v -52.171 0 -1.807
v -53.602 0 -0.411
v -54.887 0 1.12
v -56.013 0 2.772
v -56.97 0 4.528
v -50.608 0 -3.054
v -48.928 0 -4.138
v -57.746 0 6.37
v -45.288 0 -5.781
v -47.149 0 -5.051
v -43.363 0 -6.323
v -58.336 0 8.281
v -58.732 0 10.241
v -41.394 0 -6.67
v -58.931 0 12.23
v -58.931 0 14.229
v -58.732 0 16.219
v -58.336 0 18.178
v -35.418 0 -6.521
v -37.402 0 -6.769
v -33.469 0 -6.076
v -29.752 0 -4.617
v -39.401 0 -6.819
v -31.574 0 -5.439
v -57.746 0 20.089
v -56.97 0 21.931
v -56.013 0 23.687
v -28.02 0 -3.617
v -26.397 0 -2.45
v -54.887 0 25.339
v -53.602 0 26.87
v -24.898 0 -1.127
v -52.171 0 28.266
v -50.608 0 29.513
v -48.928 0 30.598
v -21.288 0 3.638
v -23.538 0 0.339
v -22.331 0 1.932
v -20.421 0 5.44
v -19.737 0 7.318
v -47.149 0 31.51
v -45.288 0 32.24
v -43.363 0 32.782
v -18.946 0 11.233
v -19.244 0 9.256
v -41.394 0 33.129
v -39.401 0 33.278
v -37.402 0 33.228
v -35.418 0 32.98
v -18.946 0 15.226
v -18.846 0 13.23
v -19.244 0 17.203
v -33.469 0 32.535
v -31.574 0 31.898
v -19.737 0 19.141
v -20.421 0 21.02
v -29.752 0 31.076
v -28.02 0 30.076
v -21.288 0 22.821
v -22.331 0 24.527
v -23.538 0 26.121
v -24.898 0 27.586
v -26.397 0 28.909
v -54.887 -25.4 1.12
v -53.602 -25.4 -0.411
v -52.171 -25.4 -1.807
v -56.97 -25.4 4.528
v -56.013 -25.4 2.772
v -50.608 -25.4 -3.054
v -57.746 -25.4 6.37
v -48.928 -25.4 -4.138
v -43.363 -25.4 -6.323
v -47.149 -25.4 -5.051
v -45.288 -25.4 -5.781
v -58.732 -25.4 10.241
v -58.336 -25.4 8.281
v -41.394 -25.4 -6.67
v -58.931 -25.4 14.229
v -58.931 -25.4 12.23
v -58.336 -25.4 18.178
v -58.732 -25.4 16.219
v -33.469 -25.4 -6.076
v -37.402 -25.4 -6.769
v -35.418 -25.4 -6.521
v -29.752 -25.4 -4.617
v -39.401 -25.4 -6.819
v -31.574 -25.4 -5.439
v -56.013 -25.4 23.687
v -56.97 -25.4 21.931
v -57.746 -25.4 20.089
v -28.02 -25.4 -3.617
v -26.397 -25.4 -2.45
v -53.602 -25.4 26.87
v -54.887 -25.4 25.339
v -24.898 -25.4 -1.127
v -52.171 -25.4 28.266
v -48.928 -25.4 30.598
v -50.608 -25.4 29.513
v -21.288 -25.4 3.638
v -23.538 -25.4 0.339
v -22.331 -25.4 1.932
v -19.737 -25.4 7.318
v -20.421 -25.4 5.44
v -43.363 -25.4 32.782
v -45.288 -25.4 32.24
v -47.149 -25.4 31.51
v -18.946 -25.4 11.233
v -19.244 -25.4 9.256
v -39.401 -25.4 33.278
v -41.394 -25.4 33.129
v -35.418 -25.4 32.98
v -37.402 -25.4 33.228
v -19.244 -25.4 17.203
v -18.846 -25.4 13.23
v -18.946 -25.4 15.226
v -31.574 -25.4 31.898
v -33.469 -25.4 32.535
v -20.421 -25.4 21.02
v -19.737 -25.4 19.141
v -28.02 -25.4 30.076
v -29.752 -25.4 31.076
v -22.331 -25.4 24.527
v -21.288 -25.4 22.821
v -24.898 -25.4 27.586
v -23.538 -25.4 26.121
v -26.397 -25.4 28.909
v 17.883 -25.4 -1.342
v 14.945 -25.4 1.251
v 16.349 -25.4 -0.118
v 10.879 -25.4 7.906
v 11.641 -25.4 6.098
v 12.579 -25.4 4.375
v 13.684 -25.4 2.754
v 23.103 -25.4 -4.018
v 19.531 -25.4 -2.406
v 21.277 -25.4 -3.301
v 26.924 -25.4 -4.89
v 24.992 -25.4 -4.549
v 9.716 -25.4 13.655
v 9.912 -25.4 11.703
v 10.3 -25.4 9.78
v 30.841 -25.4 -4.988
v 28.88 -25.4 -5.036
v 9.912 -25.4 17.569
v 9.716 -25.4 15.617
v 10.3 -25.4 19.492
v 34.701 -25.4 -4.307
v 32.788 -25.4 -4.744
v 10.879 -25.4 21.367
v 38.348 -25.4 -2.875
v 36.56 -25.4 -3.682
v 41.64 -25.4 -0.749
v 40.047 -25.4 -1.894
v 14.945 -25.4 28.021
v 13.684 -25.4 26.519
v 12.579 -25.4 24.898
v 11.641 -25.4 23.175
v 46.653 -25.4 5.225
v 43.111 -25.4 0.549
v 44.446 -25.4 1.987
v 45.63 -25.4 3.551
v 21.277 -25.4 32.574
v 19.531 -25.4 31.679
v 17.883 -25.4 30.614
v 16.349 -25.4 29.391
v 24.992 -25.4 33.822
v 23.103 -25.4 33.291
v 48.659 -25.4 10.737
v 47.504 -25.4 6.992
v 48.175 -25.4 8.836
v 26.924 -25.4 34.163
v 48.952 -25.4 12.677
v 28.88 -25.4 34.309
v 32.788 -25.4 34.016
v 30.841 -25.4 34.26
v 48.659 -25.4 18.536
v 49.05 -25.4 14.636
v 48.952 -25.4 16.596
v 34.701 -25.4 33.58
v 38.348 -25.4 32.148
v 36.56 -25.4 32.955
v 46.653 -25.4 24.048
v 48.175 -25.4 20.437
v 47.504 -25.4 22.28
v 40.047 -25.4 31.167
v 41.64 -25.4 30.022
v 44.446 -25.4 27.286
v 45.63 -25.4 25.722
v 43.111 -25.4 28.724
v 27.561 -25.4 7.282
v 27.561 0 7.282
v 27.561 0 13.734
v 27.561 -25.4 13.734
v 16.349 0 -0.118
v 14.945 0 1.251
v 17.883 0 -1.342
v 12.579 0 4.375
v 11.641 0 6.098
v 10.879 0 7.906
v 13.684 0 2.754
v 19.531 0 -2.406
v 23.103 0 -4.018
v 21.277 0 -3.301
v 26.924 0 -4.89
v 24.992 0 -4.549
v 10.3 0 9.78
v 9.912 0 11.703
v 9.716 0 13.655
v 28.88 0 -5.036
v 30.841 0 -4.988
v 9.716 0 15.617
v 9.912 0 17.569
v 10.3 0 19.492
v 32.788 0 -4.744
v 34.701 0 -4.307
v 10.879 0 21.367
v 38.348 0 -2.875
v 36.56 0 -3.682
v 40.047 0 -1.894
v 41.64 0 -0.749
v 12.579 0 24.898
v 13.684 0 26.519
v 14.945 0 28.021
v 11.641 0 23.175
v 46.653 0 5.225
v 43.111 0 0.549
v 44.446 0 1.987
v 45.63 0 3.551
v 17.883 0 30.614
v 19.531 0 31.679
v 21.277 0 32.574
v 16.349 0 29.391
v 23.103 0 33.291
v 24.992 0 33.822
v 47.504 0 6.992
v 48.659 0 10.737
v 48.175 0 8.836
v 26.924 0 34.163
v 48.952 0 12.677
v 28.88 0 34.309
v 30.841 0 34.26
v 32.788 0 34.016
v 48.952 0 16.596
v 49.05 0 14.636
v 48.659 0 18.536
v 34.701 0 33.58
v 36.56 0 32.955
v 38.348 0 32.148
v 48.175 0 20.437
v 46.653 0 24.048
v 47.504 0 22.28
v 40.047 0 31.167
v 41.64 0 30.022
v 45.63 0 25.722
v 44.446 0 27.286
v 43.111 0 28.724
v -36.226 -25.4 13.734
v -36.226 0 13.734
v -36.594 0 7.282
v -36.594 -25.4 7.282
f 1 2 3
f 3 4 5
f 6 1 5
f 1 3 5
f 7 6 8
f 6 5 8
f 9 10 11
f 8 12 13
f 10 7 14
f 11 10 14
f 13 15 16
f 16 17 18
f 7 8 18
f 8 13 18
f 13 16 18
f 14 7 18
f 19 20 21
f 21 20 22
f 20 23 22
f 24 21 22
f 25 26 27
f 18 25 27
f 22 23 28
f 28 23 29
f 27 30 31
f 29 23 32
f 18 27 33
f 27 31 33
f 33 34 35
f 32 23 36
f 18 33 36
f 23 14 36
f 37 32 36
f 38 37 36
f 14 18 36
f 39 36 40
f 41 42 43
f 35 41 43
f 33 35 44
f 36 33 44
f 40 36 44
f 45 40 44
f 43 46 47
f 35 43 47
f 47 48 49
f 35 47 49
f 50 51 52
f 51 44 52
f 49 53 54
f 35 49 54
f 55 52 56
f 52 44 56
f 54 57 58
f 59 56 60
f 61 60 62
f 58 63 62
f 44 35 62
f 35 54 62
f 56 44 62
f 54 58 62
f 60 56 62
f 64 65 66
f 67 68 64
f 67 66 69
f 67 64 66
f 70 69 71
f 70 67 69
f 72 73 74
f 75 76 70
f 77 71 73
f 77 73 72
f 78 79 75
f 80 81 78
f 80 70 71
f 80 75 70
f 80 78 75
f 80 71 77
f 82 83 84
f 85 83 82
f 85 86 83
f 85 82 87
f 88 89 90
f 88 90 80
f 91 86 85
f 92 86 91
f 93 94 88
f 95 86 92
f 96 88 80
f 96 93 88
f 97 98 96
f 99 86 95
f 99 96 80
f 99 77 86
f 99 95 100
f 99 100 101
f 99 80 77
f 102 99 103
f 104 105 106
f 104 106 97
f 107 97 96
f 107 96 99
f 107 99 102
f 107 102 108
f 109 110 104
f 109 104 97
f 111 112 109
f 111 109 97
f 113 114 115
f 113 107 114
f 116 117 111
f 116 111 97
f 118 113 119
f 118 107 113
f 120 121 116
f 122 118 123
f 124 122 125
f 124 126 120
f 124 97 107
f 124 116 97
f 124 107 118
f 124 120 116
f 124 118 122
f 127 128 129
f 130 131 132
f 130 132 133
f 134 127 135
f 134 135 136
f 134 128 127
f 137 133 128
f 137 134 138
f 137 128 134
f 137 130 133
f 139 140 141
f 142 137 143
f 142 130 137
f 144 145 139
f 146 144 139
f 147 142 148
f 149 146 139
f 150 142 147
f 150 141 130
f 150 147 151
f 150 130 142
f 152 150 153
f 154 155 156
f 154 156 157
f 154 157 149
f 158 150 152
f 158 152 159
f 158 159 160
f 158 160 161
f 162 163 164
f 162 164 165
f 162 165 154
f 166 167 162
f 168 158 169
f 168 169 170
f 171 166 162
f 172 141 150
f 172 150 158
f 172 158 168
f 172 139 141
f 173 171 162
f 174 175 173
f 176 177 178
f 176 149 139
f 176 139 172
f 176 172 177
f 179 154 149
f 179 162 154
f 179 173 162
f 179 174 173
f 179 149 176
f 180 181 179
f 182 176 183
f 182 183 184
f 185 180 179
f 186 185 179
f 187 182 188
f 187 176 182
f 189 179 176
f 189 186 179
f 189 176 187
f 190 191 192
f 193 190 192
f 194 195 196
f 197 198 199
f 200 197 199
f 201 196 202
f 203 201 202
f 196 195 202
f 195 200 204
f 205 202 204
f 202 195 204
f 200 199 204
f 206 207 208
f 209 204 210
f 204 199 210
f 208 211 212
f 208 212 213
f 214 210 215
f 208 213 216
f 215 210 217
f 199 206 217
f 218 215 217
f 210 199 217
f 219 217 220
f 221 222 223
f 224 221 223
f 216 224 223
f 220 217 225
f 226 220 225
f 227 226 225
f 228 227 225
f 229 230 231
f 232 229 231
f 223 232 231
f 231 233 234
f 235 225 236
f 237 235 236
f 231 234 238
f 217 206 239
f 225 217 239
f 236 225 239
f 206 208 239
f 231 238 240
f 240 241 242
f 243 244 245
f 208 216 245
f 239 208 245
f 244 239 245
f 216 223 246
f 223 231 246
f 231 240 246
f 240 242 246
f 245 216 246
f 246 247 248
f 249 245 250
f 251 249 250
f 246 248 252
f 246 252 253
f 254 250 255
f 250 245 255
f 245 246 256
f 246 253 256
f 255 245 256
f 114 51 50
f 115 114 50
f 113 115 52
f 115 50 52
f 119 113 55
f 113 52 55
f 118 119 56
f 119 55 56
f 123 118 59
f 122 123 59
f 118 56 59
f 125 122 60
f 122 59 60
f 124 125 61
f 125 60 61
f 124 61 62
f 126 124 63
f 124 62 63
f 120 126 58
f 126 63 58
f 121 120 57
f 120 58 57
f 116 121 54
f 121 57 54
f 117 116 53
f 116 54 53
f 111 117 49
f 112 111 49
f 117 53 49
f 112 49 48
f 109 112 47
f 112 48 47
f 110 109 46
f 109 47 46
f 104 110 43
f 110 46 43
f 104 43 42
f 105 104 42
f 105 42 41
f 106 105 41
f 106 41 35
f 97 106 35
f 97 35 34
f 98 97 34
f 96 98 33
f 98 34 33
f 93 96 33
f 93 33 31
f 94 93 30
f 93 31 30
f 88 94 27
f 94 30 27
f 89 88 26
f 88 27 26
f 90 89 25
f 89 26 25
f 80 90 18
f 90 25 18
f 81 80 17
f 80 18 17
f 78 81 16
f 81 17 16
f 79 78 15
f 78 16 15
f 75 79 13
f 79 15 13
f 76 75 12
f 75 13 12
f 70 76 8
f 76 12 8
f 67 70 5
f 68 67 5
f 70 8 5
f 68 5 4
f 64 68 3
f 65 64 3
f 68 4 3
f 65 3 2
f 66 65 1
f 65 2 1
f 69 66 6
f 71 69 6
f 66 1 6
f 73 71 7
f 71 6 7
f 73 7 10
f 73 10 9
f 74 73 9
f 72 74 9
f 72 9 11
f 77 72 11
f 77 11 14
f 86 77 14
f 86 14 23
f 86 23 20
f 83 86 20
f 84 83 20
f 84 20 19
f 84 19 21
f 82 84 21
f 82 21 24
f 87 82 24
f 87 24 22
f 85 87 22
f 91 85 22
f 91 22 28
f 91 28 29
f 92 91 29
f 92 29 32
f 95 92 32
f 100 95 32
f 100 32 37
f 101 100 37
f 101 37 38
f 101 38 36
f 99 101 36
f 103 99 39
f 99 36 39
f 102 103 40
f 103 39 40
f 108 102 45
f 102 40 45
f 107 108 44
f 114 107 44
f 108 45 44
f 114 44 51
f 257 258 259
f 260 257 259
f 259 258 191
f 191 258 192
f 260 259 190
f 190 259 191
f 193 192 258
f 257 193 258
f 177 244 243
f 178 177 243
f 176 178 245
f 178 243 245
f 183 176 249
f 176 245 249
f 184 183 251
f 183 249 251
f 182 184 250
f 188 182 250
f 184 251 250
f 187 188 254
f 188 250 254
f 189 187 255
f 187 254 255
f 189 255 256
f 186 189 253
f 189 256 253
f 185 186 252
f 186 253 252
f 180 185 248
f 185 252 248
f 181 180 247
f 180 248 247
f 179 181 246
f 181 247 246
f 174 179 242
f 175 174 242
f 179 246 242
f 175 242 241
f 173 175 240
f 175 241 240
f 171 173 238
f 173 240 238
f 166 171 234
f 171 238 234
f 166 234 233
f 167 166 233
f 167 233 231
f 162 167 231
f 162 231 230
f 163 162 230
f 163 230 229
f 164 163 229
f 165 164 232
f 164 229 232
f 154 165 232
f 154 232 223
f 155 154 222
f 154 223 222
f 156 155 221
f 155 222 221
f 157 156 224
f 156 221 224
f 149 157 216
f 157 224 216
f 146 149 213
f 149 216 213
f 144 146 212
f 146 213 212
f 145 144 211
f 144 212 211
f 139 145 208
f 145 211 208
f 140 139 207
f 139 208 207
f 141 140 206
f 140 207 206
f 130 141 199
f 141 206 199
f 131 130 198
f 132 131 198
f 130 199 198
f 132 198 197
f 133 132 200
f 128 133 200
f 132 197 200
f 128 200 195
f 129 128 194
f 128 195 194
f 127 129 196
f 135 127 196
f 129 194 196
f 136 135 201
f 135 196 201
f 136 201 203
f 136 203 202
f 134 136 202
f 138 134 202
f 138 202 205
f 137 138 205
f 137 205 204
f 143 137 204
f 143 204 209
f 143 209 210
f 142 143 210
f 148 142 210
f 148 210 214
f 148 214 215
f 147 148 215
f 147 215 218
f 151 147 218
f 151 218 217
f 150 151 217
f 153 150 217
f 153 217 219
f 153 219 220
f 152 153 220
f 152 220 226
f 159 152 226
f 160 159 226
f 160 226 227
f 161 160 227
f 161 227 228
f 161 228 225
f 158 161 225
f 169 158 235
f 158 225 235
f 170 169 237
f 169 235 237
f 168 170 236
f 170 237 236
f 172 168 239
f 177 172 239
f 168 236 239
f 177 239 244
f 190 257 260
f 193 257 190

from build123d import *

# Parameters (mm, degrees)
F0_R     = 20.054887
F0_R_2   = 19.678906
F1_DEPTH = 25.4
F3_DEPTH = 25.4


with BuildPart() as f1:
    # F0 (on Front) → F1 (new body)
    with BuildSketch(Plane.XZ):
        with Locations((-38.900782, 13.229558)):
            Circle(F0_R)
        with Locations((29.370746, 14.636378)):
            Circle(F0_R_2)
    extrude(amount=F1_DEPTH)


with BuildPart() as f3:
    # F2 (on Front) → F3 (new body)
    with BuildSketch(Plane.XZ):
        Polygon((27.561048, 13.734437), (-36.225725, 13.734437), (-36.594436, 7.282016), (27.561048, 7.282016), align=None)
    extrude(amount=F3_DEPTH)


solid = Compound([f1.part, f3.part])
